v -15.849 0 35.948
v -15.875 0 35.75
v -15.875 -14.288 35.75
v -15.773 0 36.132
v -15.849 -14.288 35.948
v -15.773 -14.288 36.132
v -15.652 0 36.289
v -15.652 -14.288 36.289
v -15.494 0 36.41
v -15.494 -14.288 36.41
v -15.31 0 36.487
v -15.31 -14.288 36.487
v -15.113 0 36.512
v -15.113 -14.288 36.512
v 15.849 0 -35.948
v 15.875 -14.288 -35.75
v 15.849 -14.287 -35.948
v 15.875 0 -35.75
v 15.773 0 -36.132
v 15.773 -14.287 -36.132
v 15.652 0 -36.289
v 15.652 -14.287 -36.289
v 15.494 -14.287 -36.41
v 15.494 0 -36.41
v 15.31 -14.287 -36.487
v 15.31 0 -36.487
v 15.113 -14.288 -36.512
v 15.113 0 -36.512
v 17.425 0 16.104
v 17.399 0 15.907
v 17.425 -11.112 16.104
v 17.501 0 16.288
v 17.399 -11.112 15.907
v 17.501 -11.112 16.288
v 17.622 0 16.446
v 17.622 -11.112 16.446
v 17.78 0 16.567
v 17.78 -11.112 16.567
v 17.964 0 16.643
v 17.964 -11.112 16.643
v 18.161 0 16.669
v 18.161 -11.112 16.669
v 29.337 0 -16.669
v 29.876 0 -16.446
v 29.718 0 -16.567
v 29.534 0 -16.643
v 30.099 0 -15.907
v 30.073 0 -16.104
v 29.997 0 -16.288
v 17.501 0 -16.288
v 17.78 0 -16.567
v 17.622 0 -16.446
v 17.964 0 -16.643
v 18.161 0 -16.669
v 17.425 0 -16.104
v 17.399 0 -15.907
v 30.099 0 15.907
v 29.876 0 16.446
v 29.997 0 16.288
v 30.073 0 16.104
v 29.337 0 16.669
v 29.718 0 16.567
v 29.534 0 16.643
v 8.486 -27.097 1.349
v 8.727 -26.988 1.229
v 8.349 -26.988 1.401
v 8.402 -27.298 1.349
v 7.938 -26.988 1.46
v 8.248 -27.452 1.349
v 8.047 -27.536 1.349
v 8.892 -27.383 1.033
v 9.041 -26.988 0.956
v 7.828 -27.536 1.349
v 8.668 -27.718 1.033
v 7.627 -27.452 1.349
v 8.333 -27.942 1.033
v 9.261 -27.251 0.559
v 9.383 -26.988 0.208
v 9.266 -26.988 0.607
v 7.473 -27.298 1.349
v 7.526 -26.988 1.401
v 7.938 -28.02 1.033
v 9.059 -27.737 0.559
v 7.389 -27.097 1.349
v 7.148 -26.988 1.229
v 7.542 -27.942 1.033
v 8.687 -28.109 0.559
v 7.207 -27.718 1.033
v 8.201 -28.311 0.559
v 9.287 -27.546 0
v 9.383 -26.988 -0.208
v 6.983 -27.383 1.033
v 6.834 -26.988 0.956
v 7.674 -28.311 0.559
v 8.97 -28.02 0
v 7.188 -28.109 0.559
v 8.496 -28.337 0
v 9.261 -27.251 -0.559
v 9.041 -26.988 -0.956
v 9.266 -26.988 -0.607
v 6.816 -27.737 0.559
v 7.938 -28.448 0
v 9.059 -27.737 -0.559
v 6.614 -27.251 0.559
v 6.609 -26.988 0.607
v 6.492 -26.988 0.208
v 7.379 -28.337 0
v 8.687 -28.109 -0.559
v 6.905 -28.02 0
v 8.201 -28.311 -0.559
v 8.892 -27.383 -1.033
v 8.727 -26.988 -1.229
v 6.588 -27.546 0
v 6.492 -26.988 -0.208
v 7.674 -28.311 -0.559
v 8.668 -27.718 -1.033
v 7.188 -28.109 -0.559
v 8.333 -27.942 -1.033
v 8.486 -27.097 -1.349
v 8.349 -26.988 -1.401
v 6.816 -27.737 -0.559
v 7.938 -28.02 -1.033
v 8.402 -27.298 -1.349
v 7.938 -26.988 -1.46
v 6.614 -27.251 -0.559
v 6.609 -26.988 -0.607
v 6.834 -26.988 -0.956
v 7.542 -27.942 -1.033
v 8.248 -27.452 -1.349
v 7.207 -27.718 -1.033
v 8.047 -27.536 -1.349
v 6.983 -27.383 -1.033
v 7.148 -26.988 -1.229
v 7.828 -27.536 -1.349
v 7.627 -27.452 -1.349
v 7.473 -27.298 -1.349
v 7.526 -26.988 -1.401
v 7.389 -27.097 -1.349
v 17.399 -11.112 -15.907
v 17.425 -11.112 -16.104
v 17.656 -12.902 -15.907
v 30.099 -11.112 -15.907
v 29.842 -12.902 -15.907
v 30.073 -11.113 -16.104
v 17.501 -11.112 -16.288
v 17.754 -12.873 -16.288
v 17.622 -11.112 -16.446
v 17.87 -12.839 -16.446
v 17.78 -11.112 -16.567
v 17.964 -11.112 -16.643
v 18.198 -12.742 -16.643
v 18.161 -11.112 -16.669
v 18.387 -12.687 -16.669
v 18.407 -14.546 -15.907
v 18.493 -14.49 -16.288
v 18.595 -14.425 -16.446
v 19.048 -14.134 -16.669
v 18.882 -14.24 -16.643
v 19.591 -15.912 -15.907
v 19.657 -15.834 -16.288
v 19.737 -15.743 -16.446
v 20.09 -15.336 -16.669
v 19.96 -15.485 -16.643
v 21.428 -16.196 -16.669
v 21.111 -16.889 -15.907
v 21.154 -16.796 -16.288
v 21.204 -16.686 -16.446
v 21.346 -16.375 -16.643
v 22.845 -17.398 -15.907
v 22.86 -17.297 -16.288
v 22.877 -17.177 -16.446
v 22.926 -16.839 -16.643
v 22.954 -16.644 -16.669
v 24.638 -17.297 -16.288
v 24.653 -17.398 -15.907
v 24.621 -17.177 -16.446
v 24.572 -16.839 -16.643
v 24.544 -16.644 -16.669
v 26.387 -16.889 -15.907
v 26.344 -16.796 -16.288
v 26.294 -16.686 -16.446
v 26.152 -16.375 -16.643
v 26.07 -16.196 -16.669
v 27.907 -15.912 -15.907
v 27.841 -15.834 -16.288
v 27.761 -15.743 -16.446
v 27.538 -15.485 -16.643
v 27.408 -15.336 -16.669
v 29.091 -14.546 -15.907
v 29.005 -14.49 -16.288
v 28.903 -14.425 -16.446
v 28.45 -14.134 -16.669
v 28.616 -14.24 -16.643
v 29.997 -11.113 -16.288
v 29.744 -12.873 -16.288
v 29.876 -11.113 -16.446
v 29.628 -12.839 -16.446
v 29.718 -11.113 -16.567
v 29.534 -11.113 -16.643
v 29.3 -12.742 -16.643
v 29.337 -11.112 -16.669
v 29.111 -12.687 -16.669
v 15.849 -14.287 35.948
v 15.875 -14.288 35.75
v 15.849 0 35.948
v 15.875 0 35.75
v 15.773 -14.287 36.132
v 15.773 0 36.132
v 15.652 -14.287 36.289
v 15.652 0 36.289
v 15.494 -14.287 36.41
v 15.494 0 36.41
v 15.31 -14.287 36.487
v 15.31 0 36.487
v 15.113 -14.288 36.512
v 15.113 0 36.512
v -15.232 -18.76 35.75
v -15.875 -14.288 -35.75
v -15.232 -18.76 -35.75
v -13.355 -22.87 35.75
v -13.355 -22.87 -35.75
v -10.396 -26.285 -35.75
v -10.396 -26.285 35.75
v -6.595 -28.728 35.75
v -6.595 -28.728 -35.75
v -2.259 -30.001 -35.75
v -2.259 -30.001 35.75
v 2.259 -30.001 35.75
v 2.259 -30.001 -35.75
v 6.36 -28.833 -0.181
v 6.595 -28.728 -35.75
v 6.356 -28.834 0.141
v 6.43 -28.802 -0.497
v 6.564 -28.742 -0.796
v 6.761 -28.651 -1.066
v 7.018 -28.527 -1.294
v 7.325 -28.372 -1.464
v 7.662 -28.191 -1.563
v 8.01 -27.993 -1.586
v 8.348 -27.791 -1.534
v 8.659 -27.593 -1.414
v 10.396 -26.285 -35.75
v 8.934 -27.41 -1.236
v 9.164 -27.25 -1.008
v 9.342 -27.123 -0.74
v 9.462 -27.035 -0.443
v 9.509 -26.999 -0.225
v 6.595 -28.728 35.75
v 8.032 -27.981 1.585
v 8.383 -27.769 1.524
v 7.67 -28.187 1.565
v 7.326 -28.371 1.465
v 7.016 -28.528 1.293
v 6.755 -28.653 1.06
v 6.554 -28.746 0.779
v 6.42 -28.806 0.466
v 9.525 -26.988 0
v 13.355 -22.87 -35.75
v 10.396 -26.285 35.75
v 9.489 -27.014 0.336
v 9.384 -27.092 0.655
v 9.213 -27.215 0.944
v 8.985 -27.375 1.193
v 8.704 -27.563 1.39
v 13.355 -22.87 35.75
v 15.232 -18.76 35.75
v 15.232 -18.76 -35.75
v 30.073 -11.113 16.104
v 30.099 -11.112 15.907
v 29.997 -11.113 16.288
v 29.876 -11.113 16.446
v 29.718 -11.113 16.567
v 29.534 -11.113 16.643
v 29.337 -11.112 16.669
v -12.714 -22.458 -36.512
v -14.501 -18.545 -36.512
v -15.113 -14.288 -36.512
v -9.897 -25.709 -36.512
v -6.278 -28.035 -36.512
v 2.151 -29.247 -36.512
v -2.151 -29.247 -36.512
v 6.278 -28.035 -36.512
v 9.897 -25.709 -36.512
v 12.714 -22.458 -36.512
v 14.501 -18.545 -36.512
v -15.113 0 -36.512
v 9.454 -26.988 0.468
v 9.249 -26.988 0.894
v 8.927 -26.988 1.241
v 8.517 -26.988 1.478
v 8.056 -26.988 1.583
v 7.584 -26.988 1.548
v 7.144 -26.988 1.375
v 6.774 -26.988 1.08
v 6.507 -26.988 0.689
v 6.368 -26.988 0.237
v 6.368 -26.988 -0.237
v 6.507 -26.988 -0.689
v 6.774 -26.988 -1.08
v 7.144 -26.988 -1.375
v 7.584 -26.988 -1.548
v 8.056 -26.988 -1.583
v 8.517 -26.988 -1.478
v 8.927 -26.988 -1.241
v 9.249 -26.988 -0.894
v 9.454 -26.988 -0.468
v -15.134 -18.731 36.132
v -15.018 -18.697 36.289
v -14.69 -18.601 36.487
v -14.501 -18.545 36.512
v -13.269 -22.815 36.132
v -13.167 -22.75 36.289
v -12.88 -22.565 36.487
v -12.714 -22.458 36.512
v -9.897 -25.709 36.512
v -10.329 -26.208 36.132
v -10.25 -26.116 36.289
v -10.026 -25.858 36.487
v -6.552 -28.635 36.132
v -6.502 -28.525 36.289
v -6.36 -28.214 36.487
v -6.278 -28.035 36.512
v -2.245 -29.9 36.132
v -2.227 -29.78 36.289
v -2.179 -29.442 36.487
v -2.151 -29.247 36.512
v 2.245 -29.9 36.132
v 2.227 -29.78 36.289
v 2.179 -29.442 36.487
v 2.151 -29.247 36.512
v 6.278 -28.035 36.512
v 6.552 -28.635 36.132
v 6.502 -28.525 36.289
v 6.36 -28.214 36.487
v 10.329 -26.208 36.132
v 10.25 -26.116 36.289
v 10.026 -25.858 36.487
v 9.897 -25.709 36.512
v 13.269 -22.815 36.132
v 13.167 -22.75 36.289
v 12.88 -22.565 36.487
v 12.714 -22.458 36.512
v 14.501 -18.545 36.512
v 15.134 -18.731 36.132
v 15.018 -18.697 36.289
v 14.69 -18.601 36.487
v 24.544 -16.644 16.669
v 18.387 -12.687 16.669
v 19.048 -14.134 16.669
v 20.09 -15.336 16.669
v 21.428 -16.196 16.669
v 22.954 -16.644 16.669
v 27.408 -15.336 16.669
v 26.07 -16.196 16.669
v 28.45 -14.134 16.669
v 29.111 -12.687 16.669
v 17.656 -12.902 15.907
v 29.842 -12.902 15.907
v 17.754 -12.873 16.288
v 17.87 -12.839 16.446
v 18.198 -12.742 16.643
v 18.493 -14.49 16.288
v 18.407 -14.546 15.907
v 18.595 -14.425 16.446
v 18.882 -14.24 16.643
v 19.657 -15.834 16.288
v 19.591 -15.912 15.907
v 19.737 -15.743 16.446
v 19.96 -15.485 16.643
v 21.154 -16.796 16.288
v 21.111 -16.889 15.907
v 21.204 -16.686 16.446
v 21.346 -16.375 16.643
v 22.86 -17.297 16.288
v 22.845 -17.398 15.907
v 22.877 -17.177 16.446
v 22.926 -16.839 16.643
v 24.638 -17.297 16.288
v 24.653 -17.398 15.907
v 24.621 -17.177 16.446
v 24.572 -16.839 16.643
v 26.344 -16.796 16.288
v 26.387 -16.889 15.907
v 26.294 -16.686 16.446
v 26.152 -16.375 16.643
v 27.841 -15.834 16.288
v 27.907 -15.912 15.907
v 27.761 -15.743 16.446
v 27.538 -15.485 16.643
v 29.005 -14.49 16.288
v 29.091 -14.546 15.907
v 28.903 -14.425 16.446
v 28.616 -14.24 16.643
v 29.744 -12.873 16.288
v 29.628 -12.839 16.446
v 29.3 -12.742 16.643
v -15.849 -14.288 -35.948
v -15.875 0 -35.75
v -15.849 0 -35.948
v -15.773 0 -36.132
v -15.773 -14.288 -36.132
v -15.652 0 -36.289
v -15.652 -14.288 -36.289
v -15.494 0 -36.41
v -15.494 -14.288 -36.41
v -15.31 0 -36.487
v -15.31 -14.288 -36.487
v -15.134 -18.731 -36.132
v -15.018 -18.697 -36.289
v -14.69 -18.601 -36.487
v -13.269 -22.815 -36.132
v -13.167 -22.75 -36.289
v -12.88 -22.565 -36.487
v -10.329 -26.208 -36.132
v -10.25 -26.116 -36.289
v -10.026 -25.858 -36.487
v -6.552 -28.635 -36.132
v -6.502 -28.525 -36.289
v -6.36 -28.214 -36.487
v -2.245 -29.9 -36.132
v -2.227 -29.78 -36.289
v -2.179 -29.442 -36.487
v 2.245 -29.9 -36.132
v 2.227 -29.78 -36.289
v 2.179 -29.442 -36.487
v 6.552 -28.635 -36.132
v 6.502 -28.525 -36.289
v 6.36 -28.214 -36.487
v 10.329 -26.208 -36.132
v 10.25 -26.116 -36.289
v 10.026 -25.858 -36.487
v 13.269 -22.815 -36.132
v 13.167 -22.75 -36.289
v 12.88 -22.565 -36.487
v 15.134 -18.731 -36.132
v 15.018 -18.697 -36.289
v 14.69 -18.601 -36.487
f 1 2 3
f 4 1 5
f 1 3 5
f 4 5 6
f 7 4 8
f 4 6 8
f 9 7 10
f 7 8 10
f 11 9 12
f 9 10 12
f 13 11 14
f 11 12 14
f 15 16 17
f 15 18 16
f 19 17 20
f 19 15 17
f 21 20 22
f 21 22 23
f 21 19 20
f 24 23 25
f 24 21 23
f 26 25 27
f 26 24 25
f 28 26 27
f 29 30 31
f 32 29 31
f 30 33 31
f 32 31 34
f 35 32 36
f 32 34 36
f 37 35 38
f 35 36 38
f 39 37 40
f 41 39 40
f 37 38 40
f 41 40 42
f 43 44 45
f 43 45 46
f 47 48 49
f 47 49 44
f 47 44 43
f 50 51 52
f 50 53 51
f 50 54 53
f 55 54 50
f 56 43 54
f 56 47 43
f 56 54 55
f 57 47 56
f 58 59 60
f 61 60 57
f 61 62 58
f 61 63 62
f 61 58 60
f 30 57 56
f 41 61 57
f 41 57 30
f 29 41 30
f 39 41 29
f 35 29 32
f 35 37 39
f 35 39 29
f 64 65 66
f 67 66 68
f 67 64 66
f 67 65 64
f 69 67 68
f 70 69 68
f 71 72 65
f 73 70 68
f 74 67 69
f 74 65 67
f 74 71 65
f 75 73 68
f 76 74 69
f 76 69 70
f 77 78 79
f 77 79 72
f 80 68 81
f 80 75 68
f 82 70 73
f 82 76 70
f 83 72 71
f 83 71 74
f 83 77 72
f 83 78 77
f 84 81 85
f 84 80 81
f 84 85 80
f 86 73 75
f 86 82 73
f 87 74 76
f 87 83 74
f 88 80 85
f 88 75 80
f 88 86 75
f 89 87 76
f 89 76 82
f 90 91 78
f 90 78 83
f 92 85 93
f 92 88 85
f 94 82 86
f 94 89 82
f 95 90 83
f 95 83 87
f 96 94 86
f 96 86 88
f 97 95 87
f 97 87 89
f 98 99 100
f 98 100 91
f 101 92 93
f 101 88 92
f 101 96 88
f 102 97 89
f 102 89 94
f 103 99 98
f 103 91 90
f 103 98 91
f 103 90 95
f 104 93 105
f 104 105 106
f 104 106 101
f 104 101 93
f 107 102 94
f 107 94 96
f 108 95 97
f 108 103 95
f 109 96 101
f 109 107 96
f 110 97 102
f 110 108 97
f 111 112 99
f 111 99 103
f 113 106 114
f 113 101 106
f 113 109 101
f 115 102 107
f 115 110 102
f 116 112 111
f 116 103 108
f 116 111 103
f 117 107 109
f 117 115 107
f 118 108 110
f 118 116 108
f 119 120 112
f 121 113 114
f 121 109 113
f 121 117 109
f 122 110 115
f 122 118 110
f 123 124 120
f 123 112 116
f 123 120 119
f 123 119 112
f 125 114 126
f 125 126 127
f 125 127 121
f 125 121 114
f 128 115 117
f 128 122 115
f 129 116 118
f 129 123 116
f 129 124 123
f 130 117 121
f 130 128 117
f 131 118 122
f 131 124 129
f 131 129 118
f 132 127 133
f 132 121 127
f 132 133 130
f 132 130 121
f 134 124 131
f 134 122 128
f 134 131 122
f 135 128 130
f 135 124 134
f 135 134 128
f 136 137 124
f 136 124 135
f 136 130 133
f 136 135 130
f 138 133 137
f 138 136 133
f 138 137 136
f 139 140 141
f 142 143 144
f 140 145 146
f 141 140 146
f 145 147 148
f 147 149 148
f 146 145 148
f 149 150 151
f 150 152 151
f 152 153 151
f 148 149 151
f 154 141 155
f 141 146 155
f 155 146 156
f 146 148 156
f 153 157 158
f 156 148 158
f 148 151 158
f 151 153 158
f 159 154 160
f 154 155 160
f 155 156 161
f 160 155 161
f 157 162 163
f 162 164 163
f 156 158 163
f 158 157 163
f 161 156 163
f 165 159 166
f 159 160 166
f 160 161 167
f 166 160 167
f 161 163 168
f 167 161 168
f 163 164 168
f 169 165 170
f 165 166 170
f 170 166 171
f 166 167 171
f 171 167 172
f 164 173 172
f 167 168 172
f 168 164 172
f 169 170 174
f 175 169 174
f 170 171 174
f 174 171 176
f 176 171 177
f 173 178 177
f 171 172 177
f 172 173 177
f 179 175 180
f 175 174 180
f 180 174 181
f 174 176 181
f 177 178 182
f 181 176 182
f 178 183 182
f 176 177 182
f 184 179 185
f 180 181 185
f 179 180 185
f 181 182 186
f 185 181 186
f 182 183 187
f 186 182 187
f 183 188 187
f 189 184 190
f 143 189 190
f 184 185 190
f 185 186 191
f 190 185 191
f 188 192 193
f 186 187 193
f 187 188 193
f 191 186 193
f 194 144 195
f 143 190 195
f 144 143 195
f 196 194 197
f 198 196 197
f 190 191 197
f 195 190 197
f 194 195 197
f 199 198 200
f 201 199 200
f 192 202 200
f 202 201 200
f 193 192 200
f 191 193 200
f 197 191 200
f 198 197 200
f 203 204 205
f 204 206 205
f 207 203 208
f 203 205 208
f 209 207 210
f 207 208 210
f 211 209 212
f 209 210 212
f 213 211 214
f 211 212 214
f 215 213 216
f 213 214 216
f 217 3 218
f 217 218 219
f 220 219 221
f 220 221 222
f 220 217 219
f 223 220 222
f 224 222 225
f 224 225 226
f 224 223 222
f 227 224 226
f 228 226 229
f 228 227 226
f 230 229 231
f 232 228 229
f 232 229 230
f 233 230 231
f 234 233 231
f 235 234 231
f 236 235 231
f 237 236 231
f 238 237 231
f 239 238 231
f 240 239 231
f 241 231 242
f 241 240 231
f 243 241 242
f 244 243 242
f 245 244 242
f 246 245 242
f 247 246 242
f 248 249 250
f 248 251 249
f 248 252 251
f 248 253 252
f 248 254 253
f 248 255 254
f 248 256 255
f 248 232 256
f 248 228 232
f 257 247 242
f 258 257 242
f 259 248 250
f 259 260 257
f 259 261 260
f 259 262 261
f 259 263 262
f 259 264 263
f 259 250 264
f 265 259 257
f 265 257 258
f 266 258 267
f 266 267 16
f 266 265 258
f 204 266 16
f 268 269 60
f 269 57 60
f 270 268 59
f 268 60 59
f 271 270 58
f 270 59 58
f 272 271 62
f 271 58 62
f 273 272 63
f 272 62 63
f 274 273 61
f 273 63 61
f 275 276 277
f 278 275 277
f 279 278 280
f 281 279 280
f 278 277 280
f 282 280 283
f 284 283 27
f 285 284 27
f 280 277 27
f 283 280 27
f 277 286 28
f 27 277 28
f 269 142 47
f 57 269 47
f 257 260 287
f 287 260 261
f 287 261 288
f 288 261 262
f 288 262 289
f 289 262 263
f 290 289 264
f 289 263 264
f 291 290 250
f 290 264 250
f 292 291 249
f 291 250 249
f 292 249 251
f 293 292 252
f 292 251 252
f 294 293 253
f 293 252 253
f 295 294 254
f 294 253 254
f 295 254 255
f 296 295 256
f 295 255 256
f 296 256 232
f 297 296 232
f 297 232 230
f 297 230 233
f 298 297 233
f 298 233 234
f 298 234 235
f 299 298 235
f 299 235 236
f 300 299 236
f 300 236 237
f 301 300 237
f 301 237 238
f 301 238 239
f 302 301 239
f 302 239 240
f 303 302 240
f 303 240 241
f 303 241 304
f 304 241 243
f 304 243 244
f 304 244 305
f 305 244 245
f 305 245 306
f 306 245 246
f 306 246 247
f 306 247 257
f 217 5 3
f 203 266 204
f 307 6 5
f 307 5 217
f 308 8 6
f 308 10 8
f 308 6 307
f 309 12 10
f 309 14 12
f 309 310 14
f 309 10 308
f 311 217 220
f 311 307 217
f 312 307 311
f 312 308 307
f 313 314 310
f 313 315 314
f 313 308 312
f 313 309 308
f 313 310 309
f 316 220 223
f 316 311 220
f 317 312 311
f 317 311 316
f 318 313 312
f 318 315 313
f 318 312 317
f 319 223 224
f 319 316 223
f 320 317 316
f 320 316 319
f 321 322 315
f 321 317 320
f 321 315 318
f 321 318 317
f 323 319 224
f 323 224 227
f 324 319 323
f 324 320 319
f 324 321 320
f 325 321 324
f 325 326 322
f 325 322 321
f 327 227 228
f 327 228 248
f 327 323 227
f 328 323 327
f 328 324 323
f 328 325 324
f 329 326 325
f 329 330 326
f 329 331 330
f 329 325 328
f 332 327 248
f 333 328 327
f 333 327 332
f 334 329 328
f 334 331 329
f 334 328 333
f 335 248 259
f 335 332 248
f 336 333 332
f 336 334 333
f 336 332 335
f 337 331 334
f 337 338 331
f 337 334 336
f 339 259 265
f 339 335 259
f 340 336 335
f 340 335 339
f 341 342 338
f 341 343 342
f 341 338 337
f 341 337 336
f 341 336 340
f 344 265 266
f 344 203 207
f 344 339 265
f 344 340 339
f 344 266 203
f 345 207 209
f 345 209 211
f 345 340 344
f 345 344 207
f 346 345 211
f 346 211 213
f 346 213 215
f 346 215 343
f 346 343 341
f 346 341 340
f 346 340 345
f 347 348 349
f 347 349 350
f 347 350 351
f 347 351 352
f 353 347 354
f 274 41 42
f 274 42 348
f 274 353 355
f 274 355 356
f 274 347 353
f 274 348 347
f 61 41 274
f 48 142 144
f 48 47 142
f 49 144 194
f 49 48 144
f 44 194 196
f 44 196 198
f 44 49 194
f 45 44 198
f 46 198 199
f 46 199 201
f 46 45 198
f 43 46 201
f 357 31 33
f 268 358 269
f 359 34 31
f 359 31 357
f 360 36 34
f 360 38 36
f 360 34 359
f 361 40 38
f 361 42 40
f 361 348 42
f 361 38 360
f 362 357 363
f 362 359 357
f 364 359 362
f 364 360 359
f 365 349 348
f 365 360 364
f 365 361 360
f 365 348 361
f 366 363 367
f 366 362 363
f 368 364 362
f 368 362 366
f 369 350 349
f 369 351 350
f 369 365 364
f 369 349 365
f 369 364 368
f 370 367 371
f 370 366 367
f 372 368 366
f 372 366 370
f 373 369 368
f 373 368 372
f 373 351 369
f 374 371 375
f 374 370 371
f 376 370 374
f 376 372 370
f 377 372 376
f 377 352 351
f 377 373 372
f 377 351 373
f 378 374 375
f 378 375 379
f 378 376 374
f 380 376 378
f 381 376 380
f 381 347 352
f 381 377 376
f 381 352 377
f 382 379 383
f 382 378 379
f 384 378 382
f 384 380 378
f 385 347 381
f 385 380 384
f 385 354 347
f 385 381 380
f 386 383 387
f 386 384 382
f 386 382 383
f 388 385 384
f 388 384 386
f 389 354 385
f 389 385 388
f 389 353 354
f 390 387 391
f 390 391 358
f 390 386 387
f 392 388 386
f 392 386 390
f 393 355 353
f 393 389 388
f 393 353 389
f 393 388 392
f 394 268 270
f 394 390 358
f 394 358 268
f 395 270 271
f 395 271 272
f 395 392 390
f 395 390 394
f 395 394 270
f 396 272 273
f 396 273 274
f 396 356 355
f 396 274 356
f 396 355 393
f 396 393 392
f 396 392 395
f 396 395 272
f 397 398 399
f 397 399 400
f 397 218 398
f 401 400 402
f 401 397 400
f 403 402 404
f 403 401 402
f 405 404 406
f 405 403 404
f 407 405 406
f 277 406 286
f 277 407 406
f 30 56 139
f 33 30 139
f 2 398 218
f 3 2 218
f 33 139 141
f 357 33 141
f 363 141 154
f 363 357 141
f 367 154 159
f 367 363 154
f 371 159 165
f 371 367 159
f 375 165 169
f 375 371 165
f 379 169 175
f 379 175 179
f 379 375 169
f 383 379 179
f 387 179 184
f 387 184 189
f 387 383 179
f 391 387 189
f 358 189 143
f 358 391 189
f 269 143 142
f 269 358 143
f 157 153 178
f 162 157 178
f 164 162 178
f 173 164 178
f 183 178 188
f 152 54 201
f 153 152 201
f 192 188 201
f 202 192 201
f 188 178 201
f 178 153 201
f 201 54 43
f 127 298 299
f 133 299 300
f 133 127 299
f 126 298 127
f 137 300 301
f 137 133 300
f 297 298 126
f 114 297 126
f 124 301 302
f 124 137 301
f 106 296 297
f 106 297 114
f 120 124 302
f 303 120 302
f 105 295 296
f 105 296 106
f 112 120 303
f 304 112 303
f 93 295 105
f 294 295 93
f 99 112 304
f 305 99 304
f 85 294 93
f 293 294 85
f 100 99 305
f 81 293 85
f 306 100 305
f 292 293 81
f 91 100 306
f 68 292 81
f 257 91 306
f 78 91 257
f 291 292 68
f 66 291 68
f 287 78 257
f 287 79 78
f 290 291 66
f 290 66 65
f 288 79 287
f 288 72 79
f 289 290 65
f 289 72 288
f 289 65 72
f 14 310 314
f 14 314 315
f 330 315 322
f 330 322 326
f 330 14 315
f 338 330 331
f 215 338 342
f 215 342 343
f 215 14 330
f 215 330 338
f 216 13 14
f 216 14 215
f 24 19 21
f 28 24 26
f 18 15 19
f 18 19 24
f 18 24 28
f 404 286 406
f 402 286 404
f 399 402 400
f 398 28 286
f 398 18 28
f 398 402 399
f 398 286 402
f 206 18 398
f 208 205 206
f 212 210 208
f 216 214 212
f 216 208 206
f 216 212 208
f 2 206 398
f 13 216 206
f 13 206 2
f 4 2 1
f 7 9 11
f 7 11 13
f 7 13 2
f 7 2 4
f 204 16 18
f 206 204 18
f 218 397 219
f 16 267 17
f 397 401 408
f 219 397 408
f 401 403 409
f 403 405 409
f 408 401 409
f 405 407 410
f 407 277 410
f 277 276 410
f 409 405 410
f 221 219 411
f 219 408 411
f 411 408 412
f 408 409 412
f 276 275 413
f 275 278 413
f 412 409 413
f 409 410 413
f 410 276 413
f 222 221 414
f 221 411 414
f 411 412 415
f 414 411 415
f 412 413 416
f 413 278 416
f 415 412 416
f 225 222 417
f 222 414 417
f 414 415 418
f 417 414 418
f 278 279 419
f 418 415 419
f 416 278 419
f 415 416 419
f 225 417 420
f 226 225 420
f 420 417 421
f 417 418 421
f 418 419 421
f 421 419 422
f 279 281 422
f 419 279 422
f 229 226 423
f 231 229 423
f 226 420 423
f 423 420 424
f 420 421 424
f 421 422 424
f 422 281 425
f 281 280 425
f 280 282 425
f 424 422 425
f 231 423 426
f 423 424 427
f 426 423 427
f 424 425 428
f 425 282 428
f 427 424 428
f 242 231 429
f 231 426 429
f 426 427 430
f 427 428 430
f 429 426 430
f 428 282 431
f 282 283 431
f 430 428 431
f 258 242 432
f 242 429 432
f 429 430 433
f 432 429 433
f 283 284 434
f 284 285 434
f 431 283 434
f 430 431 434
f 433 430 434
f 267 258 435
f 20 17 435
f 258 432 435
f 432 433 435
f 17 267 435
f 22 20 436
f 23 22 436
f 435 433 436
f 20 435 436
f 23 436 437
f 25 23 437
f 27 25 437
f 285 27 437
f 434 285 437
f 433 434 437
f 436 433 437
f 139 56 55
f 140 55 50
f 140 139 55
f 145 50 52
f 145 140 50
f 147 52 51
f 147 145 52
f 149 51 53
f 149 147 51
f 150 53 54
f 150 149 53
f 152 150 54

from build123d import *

# Parameters (mm, degrees)
F1_DEPTH  = 36.5125
F4_R      = 1.5875
F5_DEPTH  = 3.175
F8_R      = 0.762
F10_DEPTH = 16.66875
F11_R     = 0.762


with BuildPart() as f1:
    # F0 (on Top) → F1 (new body, symmetric)
    with BuildSketch(Plane.XY):
        with BuildLine():
            Line((15.875, 0), (-15.875, 0))
            Line((-15.875, 0), (-15.875, -14.2875))
            ThreePointArc((-15.875, -14.2875), (0, -30.1625), (15.875, -14.2875))
            Line((15.875, -14.2875), (15.875, 0))
        make_face()
    extrude(amount=F1_DEPTH, both=True)

    # F4 (on plane+point) → F5 (cut)
    with BuildSketch(Plane.XZ.offset(30.1625)):
        with Locations((7.9375, 0)):
            Circle(F4_R)
    extrude(amount=-F5_DEPTH, mode=Mode.SUBTRACT)

    # F6 (on face) → F7 (revolve)
    with BuildSketch(Plane.XZ.offset(26.9875)):
        with BuildLine():
            Line((7.9375, -1.4605), (7.9375, 1.4605))
            ThreePointArc((7.9375, 1.4605), (6.477, 0), (7.9375, -1.4605))
        make_face()
    revolve(axis=Axis((7.9375, -26.9875, 0), (0, 0, -1)))

    # F8
    f8_edges = [f1.edges().sort_by_distance(p)[0] for p in [
        (0, -30.1625, 36.5125),
        (0, -30.1625, -36.5125),
    ]]
    fillet(f8_edges, radius=F8_R)


with BuildPart() as f10:
    # F9 (on Top) → F10 (new body, symmetric)
    with BuildSketch(Plane.XY):
        with BuildLine():
            Line((30.099, 0), (17.399, 0))
            Line((17.399, 0), (17.399, -11.1125))
            ThreePointArc((17.399, -11.1125), (23.749, -17.4625), (30.099, -11.1125))
            Line((30.099, -11.1125), (30.099, 0))
        make_face()
    extrude(amount=F10_DEPTH, both=True)

    # F11
    f11_edges = [f10.edges().sort_by_distance(p)[0] for p in [
        (23.749, -17.4625, 16.66875),
        (23.749, -17.4625, -16.66875),
    ]]
    fillet(f11_edges, radius=F11_R)


solid = Compound([f1.part, f10.part])
